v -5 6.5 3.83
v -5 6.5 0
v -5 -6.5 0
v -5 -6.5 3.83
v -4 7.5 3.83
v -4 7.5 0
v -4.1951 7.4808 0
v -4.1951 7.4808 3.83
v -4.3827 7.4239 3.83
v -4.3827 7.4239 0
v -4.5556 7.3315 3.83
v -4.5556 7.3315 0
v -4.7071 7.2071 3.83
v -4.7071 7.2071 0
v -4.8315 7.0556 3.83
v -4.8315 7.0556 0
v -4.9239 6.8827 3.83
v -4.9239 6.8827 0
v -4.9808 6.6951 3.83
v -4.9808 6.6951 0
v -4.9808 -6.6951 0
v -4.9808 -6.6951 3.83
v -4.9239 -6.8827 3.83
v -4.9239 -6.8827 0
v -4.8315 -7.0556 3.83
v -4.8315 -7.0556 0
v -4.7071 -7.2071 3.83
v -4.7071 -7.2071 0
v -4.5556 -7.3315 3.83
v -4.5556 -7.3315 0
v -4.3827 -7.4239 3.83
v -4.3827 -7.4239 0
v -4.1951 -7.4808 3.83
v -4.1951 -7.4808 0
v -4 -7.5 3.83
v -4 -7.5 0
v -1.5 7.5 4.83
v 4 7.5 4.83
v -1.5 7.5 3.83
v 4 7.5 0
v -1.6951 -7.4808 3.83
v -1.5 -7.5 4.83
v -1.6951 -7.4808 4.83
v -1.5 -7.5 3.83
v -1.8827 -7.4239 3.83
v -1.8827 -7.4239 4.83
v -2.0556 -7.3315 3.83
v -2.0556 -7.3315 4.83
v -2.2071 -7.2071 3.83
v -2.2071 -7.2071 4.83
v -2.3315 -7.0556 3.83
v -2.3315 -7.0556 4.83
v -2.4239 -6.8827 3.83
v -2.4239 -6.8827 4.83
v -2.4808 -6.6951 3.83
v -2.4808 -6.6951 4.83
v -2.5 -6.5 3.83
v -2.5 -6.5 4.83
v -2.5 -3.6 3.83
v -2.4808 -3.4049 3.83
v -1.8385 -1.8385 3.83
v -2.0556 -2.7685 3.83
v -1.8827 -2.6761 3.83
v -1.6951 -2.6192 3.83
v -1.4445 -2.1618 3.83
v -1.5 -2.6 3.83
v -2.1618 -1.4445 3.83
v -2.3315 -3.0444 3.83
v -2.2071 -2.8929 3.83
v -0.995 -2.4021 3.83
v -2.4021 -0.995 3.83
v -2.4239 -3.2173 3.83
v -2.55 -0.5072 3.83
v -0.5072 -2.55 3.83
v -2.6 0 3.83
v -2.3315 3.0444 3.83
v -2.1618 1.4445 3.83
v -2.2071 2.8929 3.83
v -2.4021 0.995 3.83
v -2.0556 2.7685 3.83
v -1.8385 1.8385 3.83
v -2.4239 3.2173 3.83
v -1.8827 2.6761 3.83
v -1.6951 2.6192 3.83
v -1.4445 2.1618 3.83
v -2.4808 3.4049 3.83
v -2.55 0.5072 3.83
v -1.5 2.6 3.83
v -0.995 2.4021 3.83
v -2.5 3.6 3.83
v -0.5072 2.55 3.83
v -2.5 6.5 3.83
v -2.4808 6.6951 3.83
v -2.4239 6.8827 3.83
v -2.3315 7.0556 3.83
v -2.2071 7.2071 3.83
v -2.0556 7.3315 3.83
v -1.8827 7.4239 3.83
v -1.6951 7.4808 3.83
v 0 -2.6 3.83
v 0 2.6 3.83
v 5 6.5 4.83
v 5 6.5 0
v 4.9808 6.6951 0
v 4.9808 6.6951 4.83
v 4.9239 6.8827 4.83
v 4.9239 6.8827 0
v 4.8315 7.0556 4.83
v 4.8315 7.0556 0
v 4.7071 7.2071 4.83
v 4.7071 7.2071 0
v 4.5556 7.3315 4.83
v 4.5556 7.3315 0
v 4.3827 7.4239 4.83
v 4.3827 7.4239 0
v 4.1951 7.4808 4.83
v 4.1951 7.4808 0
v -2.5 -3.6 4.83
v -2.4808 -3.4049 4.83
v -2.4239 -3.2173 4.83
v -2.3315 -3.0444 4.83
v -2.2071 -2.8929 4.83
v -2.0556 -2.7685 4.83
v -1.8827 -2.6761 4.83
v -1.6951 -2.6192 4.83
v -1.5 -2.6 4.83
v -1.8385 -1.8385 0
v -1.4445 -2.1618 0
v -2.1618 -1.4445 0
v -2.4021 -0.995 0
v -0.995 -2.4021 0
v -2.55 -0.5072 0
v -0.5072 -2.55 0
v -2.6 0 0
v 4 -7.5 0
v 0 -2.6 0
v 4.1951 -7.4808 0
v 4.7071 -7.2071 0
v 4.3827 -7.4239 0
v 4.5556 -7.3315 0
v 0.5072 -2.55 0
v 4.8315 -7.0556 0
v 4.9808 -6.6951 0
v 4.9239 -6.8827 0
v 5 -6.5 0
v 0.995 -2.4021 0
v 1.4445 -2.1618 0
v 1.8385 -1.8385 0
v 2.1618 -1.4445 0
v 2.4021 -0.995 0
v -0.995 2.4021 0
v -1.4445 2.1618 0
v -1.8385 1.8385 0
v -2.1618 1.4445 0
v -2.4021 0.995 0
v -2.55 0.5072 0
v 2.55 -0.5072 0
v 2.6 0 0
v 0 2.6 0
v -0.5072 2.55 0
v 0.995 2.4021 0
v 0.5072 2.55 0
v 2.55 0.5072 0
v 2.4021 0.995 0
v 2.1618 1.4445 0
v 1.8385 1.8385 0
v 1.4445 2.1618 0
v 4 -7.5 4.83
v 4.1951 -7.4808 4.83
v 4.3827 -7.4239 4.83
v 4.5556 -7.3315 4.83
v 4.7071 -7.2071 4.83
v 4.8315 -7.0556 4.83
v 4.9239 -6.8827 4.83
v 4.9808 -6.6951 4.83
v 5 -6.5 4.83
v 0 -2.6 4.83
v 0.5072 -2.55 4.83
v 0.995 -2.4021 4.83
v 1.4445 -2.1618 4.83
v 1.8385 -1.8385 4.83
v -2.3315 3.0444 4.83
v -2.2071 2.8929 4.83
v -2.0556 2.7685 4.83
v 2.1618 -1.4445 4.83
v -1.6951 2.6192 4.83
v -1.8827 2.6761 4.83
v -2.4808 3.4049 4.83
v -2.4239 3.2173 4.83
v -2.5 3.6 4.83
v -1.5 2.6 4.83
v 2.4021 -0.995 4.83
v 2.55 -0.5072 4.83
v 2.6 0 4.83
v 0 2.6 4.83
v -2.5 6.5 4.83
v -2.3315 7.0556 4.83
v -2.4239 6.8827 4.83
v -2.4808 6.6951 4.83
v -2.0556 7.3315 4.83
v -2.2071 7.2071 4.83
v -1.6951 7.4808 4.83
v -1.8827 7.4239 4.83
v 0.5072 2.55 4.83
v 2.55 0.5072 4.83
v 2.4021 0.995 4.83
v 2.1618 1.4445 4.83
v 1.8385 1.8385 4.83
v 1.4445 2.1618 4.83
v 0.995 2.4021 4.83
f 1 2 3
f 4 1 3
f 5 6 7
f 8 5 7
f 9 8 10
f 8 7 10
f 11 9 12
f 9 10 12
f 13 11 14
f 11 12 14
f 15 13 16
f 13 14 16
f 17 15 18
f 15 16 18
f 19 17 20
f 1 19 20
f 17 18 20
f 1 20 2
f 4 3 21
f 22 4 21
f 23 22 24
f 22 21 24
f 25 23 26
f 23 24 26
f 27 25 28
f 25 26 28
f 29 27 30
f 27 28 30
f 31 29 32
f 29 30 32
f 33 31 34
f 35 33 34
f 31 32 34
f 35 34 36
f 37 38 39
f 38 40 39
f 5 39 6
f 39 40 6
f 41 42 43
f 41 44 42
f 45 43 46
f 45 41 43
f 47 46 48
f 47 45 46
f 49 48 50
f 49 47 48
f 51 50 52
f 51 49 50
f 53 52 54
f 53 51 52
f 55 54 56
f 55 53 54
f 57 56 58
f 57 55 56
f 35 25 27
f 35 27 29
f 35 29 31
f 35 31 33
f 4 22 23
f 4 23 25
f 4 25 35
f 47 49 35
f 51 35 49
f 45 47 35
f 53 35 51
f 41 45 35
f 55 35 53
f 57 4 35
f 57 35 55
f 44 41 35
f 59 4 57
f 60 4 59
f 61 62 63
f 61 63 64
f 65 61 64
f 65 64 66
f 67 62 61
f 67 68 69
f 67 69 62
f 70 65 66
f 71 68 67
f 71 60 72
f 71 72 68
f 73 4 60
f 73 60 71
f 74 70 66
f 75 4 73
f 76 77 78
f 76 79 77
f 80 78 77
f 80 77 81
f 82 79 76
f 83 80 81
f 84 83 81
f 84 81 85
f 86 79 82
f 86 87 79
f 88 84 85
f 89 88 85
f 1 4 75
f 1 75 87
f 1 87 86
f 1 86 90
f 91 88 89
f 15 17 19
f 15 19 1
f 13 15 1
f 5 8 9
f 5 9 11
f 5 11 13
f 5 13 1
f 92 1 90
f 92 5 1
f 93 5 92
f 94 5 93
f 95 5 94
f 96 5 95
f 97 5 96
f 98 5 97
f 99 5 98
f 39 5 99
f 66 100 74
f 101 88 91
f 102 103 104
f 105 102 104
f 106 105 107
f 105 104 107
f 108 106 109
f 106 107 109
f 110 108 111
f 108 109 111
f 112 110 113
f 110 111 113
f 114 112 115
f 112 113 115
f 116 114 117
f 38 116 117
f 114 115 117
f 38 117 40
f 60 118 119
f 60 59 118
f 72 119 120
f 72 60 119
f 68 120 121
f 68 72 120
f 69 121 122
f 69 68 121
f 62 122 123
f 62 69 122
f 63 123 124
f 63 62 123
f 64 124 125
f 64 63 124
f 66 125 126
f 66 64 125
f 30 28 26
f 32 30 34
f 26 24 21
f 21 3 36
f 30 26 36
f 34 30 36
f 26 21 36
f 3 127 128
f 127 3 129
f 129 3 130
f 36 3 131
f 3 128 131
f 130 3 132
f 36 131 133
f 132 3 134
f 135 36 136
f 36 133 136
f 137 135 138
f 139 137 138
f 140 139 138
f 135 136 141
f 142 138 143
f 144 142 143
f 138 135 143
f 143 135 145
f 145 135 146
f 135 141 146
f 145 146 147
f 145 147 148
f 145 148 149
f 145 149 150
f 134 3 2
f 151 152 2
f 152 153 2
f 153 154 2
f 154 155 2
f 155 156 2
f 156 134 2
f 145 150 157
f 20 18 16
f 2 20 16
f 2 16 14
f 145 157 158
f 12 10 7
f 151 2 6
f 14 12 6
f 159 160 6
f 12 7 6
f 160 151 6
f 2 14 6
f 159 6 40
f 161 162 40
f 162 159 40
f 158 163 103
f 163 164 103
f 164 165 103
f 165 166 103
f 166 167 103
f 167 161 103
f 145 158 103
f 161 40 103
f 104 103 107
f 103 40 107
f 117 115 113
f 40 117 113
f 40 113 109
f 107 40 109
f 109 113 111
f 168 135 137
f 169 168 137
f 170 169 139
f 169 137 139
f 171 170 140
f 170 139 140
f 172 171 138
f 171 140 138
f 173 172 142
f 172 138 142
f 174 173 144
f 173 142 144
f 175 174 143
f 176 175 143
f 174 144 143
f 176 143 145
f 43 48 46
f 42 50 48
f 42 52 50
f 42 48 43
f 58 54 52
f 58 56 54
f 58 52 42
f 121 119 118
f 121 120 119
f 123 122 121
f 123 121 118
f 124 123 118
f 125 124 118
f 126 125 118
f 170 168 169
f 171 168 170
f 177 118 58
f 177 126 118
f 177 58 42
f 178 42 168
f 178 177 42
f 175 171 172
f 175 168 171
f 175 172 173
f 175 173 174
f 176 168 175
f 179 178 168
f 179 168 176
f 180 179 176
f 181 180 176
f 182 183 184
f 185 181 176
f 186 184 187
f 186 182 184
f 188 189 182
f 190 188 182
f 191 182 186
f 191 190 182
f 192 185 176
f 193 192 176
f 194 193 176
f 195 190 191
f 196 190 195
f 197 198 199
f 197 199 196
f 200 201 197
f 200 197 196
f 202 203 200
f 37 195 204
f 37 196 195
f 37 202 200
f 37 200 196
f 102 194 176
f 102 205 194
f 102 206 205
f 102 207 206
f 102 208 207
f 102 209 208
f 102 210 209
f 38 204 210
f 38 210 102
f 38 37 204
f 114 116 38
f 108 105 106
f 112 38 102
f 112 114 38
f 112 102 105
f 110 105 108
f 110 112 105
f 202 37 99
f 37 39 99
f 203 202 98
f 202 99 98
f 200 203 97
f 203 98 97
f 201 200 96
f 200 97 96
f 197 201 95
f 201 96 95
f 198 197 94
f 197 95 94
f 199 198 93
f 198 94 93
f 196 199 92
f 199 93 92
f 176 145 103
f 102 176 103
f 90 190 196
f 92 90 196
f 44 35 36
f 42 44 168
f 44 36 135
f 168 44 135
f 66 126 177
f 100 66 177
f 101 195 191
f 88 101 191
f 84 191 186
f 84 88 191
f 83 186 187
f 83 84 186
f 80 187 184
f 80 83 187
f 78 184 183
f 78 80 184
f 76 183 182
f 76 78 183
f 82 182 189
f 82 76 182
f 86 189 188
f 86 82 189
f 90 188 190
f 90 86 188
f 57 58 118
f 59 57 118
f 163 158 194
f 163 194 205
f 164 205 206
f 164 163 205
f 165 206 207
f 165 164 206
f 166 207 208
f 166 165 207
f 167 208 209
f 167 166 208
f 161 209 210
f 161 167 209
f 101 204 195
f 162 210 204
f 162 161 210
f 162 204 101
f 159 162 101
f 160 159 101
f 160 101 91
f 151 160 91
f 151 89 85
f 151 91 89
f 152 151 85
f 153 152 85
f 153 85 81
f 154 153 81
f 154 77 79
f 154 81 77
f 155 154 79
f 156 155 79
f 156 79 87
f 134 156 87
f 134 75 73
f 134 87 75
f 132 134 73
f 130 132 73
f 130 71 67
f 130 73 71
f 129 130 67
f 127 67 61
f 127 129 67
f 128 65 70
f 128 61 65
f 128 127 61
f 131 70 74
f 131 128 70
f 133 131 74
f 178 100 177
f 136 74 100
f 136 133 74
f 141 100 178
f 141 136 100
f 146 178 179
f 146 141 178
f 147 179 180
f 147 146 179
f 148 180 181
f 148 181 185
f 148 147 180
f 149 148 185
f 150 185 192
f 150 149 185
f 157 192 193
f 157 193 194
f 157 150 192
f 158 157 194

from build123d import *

# Parameters (mm, degrees)
F0_R     = 2.6
F1_DEPTH = 4.83
F3_DEPTH = 1
F4_R     = 1


with BuildPart() as f1:
    # F0 (on Top) → F1 (new body)
    with BuildSketch(Plane.XY):
        with BuildLine():
            Line((-4, -7.5), (4, -7.5))
            ThreePointArc((4, -7.5), (4.7071067812, -7.2071067812), (5, -6.5))
            Line((5, -6.5), (5, 6.5))
            ThreePointArc((5, 6.5), (4.7071067812, 7.2071067812), (4, 7.5))
            Line((4, 7.5), (-4, 7.5))
            ThreePointArc((-4, 7.5), (-4.7071067812, 7.2071067812), (-5, 6.5))
            Line((-5, 6.5), (-5, -6.5))
            ThreePointArc((-5, -6.5), (-4.7071067812, -7.2071067812), (-4, -7.5))
        make_face()
        Circle(F0_R, mode=Mode.SUBTRACT)
    extrude(amount=F1_DEPTH)

    # F2 (on face) → F3 (cut)
    with BuildSketch(Plane.XY.offset(4.83)):
        with BuildLine():
            Line((-2.5, 2.6), (-2.5, 7.5))
            Line((-2.5, 7.5), (-4, 7.5))
            ThreePointArc((-4, 7.5), (-4.7071067812, 7.2071067812), (-5, 6.5))
            Line((-5, 6.5), (-5, -6.5))
            ThreePointArc((-5, -6.5), (-4.7071067812, -7.2071067812), (-4, -7.5))
            Line((-4, -7.5), (-2.5, -7.5))
            Line((-2.5, -7.5), (-2.5, -2.6))
            Line((-2.5, -2.6), (0, -2.6))
            ThreePointArc((0, -2.6), (-2.6, 0), (0, 2.6))
            Line((0, 2.6), (-2.5, 2.6))
        make_face()
    extrude(amount=-F3_DEPTH, mode=Mode.SUBTRACT)

    # F4
    f4_edges = [f1.edges().sort_by_distance(p)[0] for p in [
        (-2.5, -7.5, 4.33),
        (-2.5, 2.6, 4.33),
        (-2.5, -2.6, 4.33),
        (-2.5, 7.5, 4.33),
    ]]
    fillet(f4_edges, radius=F4_R)


solid = f1.part
